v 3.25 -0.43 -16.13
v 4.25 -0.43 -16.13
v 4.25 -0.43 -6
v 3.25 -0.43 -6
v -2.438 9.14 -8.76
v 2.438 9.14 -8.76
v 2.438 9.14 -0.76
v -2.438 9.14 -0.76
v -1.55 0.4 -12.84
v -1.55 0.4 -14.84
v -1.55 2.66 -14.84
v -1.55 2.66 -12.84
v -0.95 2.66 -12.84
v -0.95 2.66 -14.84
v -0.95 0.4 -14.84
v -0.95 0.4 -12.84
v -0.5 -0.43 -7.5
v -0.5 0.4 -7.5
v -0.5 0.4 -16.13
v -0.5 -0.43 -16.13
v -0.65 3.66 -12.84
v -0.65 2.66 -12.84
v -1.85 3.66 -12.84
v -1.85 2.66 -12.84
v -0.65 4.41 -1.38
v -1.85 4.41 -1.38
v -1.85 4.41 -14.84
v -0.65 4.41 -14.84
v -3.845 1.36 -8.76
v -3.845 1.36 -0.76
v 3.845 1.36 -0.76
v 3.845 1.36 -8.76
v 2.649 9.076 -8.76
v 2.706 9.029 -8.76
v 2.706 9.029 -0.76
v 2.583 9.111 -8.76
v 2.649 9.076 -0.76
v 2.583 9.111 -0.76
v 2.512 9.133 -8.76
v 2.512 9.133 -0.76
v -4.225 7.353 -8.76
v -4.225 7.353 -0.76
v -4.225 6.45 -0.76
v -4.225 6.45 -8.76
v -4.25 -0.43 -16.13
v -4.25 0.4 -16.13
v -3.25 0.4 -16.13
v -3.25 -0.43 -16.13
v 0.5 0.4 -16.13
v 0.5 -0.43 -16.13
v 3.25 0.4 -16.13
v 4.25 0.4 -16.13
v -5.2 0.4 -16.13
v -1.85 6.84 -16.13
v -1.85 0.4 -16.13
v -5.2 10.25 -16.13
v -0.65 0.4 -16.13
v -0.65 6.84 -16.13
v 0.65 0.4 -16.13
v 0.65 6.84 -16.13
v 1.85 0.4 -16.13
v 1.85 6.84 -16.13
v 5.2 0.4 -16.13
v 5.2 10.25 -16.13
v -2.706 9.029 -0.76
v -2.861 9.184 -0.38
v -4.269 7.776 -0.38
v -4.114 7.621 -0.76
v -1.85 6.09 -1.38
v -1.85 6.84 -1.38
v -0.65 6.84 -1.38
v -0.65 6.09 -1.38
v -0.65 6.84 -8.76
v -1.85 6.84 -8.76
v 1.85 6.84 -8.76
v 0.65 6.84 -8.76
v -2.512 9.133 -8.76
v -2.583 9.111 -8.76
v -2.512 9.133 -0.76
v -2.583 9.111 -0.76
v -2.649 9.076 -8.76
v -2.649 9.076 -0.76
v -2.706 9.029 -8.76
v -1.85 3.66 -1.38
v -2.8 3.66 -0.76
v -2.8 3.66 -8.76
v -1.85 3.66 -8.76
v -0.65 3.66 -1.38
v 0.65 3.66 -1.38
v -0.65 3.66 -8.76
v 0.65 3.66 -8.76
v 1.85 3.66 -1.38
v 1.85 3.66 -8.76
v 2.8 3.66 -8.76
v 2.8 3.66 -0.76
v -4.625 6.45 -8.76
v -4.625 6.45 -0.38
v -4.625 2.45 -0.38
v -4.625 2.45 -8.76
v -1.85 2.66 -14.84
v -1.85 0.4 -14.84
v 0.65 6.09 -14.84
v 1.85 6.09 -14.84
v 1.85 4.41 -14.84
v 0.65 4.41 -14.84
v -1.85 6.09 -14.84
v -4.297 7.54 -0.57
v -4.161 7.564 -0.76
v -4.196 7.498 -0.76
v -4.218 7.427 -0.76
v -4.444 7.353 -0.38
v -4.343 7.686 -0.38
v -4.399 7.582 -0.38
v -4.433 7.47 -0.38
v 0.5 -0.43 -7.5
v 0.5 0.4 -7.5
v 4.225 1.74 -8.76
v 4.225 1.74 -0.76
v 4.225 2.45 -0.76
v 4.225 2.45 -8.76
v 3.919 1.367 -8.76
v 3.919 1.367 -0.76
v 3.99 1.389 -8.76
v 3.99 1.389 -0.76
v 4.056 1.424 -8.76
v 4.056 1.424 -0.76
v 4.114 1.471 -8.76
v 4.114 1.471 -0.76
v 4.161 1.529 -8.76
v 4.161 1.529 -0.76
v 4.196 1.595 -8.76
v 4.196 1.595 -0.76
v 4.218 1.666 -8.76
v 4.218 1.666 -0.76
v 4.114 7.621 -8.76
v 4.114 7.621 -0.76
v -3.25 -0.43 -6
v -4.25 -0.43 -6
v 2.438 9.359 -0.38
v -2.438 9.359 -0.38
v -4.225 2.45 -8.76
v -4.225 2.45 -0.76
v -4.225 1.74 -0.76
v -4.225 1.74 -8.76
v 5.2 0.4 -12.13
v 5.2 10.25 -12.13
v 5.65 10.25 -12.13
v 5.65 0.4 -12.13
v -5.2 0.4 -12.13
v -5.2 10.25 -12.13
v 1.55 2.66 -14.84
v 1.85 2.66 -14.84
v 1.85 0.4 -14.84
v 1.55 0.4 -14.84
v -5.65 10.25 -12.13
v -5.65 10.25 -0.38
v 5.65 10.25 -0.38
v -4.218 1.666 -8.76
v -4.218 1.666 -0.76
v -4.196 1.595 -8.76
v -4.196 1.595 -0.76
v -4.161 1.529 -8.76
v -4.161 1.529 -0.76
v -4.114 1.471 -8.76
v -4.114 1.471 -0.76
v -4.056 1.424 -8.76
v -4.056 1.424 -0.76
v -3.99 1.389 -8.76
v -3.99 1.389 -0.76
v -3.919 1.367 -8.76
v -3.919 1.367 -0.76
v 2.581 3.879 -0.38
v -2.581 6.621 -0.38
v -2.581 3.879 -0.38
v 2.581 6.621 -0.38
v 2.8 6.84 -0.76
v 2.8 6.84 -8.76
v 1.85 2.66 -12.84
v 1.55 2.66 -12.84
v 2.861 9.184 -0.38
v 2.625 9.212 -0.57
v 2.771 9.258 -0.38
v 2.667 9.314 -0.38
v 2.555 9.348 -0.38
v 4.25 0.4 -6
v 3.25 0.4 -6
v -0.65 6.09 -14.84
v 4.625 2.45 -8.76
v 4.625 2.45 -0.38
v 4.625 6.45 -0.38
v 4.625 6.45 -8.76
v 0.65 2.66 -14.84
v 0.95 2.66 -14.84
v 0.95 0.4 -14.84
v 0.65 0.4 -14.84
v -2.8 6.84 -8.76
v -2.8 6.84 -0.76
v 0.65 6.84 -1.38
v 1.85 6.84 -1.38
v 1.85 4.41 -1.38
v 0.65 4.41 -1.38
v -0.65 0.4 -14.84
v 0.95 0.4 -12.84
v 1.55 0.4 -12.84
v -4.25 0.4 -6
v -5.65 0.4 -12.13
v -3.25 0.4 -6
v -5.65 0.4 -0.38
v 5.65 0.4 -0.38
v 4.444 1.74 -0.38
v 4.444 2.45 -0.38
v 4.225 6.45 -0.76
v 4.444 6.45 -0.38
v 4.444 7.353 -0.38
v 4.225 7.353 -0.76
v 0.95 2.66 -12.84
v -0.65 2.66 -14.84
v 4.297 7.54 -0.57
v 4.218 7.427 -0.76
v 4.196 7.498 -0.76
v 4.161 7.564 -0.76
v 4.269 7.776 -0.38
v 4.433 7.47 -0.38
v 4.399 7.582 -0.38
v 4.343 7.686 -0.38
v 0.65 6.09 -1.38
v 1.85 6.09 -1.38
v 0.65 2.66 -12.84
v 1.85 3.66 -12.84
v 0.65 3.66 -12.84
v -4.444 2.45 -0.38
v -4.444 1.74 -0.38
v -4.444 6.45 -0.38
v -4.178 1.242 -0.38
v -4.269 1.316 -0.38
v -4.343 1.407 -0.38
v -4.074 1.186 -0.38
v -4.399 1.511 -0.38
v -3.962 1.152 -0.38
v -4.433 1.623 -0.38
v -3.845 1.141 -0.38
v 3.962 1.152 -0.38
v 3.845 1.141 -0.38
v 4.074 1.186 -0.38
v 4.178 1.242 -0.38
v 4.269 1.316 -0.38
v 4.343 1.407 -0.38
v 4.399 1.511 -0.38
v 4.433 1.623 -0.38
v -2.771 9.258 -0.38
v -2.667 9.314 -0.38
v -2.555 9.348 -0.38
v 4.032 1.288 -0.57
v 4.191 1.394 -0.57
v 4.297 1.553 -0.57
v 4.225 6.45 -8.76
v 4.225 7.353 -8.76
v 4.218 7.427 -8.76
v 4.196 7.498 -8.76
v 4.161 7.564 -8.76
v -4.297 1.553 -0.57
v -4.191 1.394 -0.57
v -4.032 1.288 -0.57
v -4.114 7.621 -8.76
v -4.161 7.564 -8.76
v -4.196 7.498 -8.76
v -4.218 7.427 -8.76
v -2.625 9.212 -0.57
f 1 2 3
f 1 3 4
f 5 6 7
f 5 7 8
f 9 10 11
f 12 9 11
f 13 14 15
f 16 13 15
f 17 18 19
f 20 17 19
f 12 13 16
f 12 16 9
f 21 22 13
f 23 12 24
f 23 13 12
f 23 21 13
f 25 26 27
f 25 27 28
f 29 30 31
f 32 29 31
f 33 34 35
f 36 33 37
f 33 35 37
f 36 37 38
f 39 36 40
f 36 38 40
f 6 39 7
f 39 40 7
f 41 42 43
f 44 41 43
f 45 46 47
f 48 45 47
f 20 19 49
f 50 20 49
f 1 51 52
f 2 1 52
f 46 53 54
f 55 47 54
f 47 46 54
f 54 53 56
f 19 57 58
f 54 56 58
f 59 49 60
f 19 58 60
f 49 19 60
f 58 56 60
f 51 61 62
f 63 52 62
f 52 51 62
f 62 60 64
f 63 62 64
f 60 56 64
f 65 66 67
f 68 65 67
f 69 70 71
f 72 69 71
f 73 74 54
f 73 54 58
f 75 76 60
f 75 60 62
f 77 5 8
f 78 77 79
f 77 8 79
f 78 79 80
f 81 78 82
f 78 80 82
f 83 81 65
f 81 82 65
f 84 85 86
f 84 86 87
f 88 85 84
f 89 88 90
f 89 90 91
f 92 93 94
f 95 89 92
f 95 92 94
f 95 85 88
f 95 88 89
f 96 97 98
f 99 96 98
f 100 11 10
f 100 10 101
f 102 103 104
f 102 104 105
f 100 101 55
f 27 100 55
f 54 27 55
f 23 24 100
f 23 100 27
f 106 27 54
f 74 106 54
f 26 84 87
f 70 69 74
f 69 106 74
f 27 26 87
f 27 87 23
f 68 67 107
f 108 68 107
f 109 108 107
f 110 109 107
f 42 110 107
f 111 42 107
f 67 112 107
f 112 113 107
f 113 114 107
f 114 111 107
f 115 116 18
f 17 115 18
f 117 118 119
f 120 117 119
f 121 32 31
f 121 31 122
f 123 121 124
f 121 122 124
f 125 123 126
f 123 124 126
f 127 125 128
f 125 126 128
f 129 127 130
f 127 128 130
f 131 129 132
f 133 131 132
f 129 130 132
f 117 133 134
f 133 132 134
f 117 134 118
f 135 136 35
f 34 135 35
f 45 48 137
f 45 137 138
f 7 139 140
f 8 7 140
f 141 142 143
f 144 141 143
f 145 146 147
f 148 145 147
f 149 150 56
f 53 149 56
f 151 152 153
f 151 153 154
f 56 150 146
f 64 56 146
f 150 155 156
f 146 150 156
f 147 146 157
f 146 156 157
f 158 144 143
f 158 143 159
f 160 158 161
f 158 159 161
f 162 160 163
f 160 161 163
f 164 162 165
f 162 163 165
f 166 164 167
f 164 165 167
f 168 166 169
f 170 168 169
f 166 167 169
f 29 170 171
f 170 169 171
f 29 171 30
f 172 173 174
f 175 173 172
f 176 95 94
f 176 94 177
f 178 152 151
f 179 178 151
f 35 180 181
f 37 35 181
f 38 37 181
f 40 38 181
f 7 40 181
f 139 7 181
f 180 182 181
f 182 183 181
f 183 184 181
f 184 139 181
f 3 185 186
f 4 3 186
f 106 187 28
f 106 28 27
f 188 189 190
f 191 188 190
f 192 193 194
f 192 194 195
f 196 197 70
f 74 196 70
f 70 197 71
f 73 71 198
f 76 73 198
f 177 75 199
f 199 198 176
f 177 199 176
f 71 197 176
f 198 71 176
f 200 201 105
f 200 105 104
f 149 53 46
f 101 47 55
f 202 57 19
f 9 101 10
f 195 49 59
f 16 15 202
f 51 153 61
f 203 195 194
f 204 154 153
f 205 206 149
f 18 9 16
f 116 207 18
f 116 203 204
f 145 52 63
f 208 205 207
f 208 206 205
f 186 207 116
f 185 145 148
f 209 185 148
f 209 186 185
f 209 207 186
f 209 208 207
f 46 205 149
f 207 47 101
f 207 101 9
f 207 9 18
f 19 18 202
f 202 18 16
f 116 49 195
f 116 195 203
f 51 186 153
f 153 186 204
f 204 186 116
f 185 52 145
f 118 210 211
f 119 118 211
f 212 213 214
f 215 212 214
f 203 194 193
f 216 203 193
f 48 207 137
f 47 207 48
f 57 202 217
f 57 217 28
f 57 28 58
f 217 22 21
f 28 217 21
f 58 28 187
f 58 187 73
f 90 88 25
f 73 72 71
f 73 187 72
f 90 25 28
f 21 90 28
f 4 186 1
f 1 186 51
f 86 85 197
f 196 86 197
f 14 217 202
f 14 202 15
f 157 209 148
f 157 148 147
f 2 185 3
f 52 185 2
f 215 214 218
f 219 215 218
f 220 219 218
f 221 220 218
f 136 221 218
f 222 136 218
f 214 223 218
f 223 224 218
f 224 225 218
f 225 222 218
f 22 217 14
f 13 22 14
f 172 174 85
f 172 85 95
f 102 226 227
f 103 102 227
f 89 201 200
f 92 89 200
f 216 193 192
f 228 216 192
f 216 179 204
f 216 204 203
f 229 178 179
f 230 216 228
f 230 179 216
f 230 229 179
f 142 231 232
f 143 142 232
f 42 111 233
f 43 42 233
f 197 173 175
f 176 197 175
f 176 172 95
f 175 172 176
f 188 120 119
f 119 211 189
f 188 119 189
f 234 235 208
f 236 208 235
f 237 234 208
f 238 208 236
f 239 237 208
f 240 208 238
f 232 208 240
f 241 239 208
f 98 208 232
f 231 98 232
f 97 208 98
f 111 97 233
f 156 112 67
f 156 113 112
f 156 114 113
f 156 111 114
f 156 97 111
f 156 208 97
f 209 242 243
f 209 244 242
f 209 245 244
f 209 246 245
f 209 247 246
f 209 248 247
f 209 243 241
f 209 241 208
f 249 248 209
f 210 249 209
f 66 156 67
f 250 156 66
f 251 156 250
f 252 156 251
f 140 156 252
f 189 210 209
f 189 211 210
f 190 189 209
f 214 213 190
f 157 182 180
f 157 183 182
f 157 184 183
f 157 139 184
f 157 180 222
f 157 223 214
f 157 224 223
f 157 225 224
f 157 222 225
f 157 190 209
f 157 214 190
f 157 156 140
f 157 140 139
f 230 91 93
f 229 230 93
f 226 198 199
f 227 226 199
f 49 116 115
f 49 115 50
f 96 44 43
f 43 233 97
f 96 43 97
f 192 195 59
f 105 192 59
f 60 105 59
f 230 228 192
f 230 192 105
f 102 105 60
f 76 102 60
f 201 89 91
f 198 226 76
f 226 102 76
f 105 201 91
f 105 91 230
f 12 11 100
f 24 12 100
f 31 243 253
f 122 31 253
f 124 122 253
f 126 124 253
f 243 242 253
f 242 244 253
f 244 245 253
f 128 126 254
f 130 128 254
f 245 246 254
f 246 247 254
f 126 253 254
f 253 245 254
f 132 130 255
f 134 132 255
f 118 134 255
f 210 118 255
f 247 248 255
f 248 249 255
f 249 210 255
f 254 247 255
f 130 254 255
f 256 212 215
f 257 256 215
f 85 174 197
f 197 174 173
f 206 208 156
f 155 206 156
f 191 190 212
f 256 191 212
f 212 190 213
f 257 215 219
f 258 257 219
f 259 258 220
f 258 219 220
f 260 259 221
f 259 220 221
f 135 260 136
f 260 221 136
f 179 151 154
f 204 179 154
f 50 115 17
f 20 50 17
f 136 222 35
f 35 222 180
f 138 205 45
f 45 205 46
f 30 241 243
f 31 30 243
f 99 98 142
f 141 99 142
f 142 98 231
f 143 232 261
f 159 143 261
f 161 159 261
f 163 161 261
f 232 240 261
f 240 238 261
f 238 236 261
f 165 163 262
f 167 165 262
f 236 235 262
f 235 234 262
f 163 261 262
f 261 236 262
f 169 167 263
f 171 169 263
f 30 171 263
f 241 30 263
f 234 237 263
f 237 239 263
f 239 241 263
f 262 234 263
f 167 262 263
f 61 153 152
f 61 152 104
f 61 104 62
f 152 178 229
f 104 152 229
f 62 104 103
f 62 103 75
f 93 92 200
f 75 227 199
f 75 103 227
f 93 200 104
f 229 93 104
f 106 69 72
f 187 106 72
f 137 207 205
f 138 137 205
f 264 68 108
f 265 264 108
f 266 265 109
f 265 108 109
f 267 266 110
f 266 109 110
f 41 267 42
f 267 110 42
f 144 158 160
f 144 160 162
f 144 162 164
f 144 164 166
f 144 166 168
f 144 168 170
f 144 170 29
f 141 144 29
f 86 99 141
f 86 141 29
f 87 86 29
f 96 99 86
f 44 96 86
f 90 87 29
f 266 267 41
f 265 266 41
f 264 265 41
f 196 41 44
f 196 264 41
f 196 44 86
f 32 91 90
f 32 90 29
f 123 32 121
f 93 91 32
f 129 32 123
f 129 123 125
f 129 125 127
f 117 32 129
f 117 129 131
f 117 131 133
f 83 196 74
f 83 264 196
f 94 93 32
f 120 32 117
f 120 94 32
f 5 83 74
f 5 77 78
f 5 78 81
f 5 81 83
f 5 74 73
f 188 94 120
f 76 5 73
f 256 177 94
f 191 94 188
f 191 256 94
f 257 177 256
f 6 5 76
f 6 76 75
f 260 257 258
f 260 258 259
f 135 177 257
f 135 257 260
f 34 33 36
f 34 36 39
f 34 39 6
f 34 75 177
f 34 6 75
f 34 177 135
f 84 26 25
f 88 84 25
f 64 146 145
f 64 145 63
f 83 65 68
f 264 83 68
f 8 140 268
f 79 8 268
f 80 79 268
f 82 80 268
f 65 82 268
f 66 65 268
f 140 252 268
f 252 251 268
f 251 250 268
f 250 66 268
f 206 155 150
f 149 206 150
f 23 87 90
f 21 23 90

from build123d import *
from OCP.BRepFilletAPI import BRepFilletAPI_MakeChamfer

# Parameters (mm, degrees)
SKETCH1_W           = 11.3
SKETCH1_H           = 9.85
BOSS_EXTRUDE1_DEPTH = 15.75
SKETCH2_W           = 0.45
SKETCH2_H           = 4
CUT_EXTRUDE1_DEPTH  = 15.75
SKETCH3_W           = 5.6
SKETCH3_H           = 3.18
CUT_EXTRUDE2_DEPTH  = 8.38
CHAMFER1_SIZE       = 0.38
CHAMFER1_SIZE2      = 0.219393102
CHAMFER2_SIZE       = 0.38
CHAMFER2_SIZE2      = 0.219393102
SKETCH4_W           = 1
SKETCH4_H           = 10.13
SKETCH4_H_2         = 8.63
BOSS_EXTRUDE2_DEPTH = 0.83
SKETCH5_W           = 1.2
SKETCH5_H           = 0.75
CUT_EXTRUDE3_DEPTH  = 19.829431749
SKETCH6_W           = 1.2
SKETCH6_H           = 6.44
CUT_EXTRUDE4_DEPTH  = 1.29
CUT_EXTRUDE5_DEPTH  = 2


with BuildPart() as part:
    # Sketch1 → Boss-Extrude1 (new body)
    with BuildSketch(Plane.XY.offset(-0.38)):
        with Locations((0, 5.325)):
            Rectangle(SKETCH1_W, SKETCH1_H)
    extrude(amount=-BOSS_EXTRUDE1_DEPTH)

    # Sketch2 → Cut-Extrude1 (cut)
    with BuildSketch(Plane(origin=(0, 10.25, 0), x_dir=(1, 0, 0), z_dir=(0, 1, 0))):
        with Locations((-5.425, 14.13)):
            Rectangle(SKETCH2_W, SKETCH2_H)
        with Locations((5.425, 14.13)):
            Rectangle(SKETCH2_W, SKETCH2_H)
    extrude(amount=-CUT_EXTRUDE1_DEPTH, mode=Mode.SUBTRACT)

    # Sketch3 → Cut-Extrude2 (cut)
    with BuildSketch(Plane.XY.offset(-0.38)):
        with BuildLine():
            Line((-4.225, 7.352598846), (-4.225, 6.45))
            Line((-4.225, 6.45), (-4.625, 6.45))
            Line((-4.625, 6.45), (-4.625, 2.45))
            Line((-4.625, 2.45), (-4.225, 2.45))
            Line((-4.225, 2.45), (-4.225, 1.74))
            ThreePointArc((-4.225, 1.74), (-4.113700577, 1.471299423), (-3.845, 1.36))
            Line((-3.845, 1.36), (3.845, 1.36))
            ThreePointArc((3.845, 1.36), (4.113700577, 1.471299423), (4.225, 1.74))
            Line((4.225, 1.74), (4.225, 2.45))
            Line((4.225, 2.45), (4.625, 2.45))
            Line((4.625, 2.45), (4.625, 6.45))
            Line((4.625, 6.45), (4.225, 6.45))
            Line((4.225, 6.45), (4.225, 7.352598846))
            ThreePointArc((4.225, 7.352598846), (4.196074222, 7.498018551), (4.113700577, 7.621299423))
            Line((4.113700577, 7.621299423), (2.706299423, 9.028700577))
            ThreePointArc((2.706299423, 9.028700577), (2.583018551, 9.111074222), (2.437598846, 9.14))
            Line((2.437598846, 9.14), (-2.437598846, 9.14))
            ThreePointArc((-2.437598846, 9.14), (-2.583018551, 9.111074222), (-2.706299423, 9.028700577))
            Line((-2.706299423, 9.028700577), (-4.113700577, 7.621299423))
            ThreePointArc((-4.113700577, 7.621299423), (-4.196074222, 7.498018551), (-4.225, 7.352598846))
        make_face()
        with Locations((0, 5.25)):
            Rectangle(SKETCH3_W, SKETCH3_H, mode=Mode.SUBTRACT)
    extrude(amount=-CUT_EXTRUDE2_DEPTH, mode=Mode.SUBTRACT)

    # Chamfer1: one chamfer whose edges measure the first distance from different faces: ONE call of the kernel's chamfer builder (chamfer() names one face for all edges)
    chamfer1_edges_1 = [part.edges().sort_by_distance(p)[0] for p in [
        (-2.8, 5.25, -0.38),
    ]]
    chamfer1_side_1 = [part.faces().sort_by_distance(p)[0] for p in [
        (-2.8, 5.25, -4.57),
    ]]
    chamfer1_edges_2 = [part.edges().sort_by_distance(p)[0] for p in [
        (0, 6.84, -0.38),
    ]]
    chamfer1_side_2 = [part.faces().sort_by_distance(p)[0] for p in [
        (0, 6.84, -4.57),
    ]]
    chamfer1_edges_3 = [part.edges().sort_by_distance(p)[0] for p in [
        (2.8, 5.25, -0.38),
    ]]
    chamfer1_side_3 = [part.faces().sort_by_distance(p)[0] for p in [
        (2.8, 5.25, -4.57),
    ]]
    chamfer1_edges_4 = [part.edges().sort_by_distance(p)[0] for p in [
        (0, 3.66, -0.38),
    ]]
    chamfer1_side_4 = [part.faces().sort_by_distance(p)[0] for p in [
        (0, 3.66, -4.57),
    ]]
    chamfer1 = BRepFilletAPI_MakeChamfer(part.part.solid().wrapped)
    for e in chamfer1_edges_1:
        chamfer1.Add(CHAMFER1_SIZE, CHAMFER1_SIZE2, e.wrapped, chamfer1_side_1[0].wrapped)  # the first distance lies on this face
    for e in chamfer1_edges_2:
        chamfer1.Add(CHAMFER1_SIZE, CHAMFER1_SIZE2, e.wrapped, chamfer1_side_2[0].wrapped)  # the first distance lies on this face
    for e in chamfer1_edges_3:
        chamfer1.Add(CHAMFER1_SIZE, CHAMFER1_SIZE2, e.wrapped, chamfer1_side_3[0].wrapped)  # the first distance lies on this face
    for e in chamfer1_edges_4:
        chamfer1.Add(CHAMFER1_SIZE, CHAMFER1_SIZE2, e.wrapped, chamfer1_side_4[0].wrapped)  # the first distance lies on this face
    add(Compound.cast(chamfer1.Shape()), mode=Mode.REPLACE)

    # Chamfer2: one chamfer whose edges measure the first distance from different faces: ONE call of the kernel's chamfer builder (chamfer() names one face for all edges)
    chamfer2_edges_1 = [part.edges().sort_by_distance(p)[0] for p in [
        (-4.196074222, 7.498018551, -0.38),
    ]]
    chamfer2_side_1 = [part.faces().sort_by_distance(p)[0] for p in [
        (-4.196074222, 7.498018551, -4.57),
    ]]
    chamfer2_edges_2 = [part.edges().sort_by_distance(p)[0] for p in [
        (-4.225, 6.901299423, -0.38),
    ]]
    chamfer2_side_2 = [part.faces().sort_by_distance(p)[0] for p in [
        (-4.225, 6.901299423, -4.57),
    ]]
    chamfer2_edges_3 = [part.edges().sort_by_distance(p)[0] for p in [
        (-4.225, 2.095, -0.38),
    ]]
    chamfer2_side_3 = [part.faces().sort_by_distance(p)[0] for p in [
        (-4.225, 2.095, -4.57),
    ]]
    chamfer2_edges_4 = [part.edges().sort_by_distance(p)[0] for p in [
        (-4.113700577, 1.471299423, -0.38),
    ]]
    chamfer2_side_4 = [part.faces().sort_by_distance(p)[0] for p in [
        (-4.113700577, 1.471299423, -4.57),
    ]]
    chamfer2_edges_5 = [part.edges().sort_by_distance(p)[0] for p in [
        (0, 1.36, -0.38),
    ]]
    chamfer2_side_5 = [part.faces().sort_by_distance(p)[0] for p in [
        (0, 1.36, -4.57),
    ]]
    chamfer2_edges_6 = [part.edges().sort_by_distance(p)[0] for p in [
        (4.113700577, 1.471299423, -0.38),
    ]]
    chamfer2_side_6 = [part.faces().sort_by_distance(p)[0] for p in [
        (4.113700577, 1.471299423, -4.57),
    ]]
    chamfer2_edges_7 = [part.edges().sort_by_distance(p)[0] for p in [
        (4.225, 2.095, -0.38),
    ]]
    chamfer2_side_7 = [part.faces().sort_by_distance(p)[0] for p in [
        (4.225, 2.095, -4.57),
    ]]
    chamfer2_edges_8 = [part.edges().sort_by_distance(p)[0] for p in [
        (4.225, 6.901299423, -0.38),
    ]]
    chamfer2_side_8 = [part.faces().sort_by_distance(p)[0] for p in [
        (4.225, 6.901299423, -4.57),
    ]]
    chamfer2_edges_9 = [part.edges().sort_by_distance(p)[0] for p in [
        (4.196074222, 7.498018551, -0.38),
    ]]
    chamfer2_side_9 = [part.faces().sort_by_distance(p)[0] for p in [
        (4.196074222, 7.498018551, -4.57),
    ]]
    chamfer2_edges_10 = [part.edges().sort_by_distance(p)[0] for p in [
        (3.41, 8.325, -0.38),
    ]]
    chamfer2_side_10 = [part.faces().sort_by_distance(p)[0] for p in [
        (3.41, 8.325, -4.57),
    ]]
    chamfer2_edges_11 = [part.edges().sort_by_distance(p)[0] for p in [
        (2.583018551, 9.111074222, -0.38),
    ]]
    chamfer2_side_11 = [part.faces().sort_by_distance(p)[0] for p in [
        (2.583018551, 9.111074222, -4.57),
    ]]
    chamfer2_edges_12 = [part.edges().sort_by_distance(p)[0] for p in [
        (0, 9.14, -0.38),
    ]]
    chamfer2_side_12 = [part.faces().sort_by_distance(p)[0] for p in [
        (0, 9.14, -4.57),
    ]]
    chamfer2_edges_13 = [part.edges().sort_by_distance(p)[0] for p in [
        (-2.583018551, 9.111074222, -0.38),
    ]]
    chamfer2_side_13 = [part.faces().sort_by_distance(p)[0] for p in [
        (-2.583018551, 9.111074222, -4.57),
    ]]
    chamfer2_edges_14 = [part.edges().sort_by_distance(p)[0] for p in [
        (-3.41, 8.325, -0.38),
    ]]
    chamfer2_side_14 = [part.faces().sort_by_distance(p)[0] for p in [
        (-3.41, 8.325, -4.57),
    ]]
    chamfer2 = BRepFilletAPI_MakeChamfer(part.part.solid().wrapped)
    for e in chamfer2_edges_1:
        chamfer2.Add(CHAMFER2_SIZE, CHAMFER2_SIZE2, e.wrapped, chamfer2_side_1[0].wrapped)  # the first distance lies on this face
    for e in chamfer2_edges_2:
        chamfer2.Add(CHAMFER2_SIZE, CHAMFER2_SIZE2, e.wrapped, chamfer2_side_2[0].wrapped)  # the first distance lies on this face
    for e in chamfer2_edges_3:
        chamfer2.Add(CHAMFER2_SIZE, CHAMFER2_SIZE2, e.wrapped, chamfer2_side_3[0].wrapped)  # the first distance lies on this face
    for e in chamfer2_edges_4:
        chamfer2.Add(CHAMFER2_SIZE, CHAMFER2_SIZE2, e.wrapped, chamfer2_side_4[0].wrapped)  # the first distance lies on this face
    for e in chamfer2_edges_5:
        chamfer2.Add(CHAMFER2_SIZE, CHAMFER2_SIZE2, e.wrapped, chamfer2_side_5[0].wrapped)  # the first distance lies on this face
    for e in chamfer2_edges_6:
        chamfer2.Add(CHAMFER2_SIZE, CHAMFER2_SIZE2, e.wrapped, chamfer2_side_6[0].wrapped)  # the first distance lies on this face
    for e in chamfer2_edges_7:
        chamfer2.Add(CHAMFER2_SIZE, CHAMFER2_SIZE2, e.wrapped, chamfer2_side_7[0].wrapped)  # the first distance lies on this face
    for e in chamfer2_edges_8:
        chamfer2.Add(CHAMFER2_SIZE, CHAMFER2_SIZE2, e.wrapped, chamfer2_side_8[0].wrapped)  # the first distance lies on this face
    for e in chamfer2_edges_9:
        chamfer2.Add(CHAMFER2_SIZE, CHAMFER2_SIZE2, e.wrapped, chamfer2_side_9[0].wrapped)  # the first distance lies on this face
    for e in chamfer2_edges_10:
        chamfer2.Add(CHAMFER2_SIZE, CHAMFER2_SIZE2, e.wrapped, chamfer2_side_10[0].wrapped)  # the first distance lies on this face
    for e in chamfer2_edges_11:
        chamfer2.Add(CHAMFER2_SIZE, CHAMFER2_SIZE2, e.wrapped, chamfer2_side_11[0].wrapped)  # the first distance lies on this face
    for e in chamfer2_edges_12:
        chamfer2.Add(CHAMFER2_SIZE, CHAMFER2_SIZE2, e.wrapped, chamfer2_side_12[0].wrapped)  # the first distance lies on this face
    for e in chamfer2_edges_13:
        chamfer2.Add(CHAMFER2_SIZE, CHAMFER2_SIZE2, e.wrapped, chamfer2_side_13[0].wrapped)  # the first distance lies on this face
    for e in chamfer2_edges_14:
        chamfer2.Add(CHAMFER2_SIZE, CHAMFER2_SIZE2, e.wrapped, chamfer2_side_14[0].wrapped)  # the first distance lies on this face
    add(Compound.cast(chamfer2.Shape()), mode=Mode.REPLACE)

    # Sketch4 → Boss-Extrude2 (add)
    with BuildSketch(Plane(origin=(0, 0.4, 0), x_dir=(-1, 0, 0), z_dir=(0, -1, 0))):
        with Locations((3.75, 11.065)):
            Rectangle(SKETCH4_W, SKETCH4_H)
        with Locations((0, 11.815)):
            Rectangle(SKETCH4_W, SKETCH4_H_2)
        with Locations((-3.75, 11.065)):
            Rectangle(SKETCH4_W, SKETCH4_H)
    extrude(amount=BOSS_EXTRUDE2_DEPTH)

    # Sketch5 → Cut-Extrude3 (cut, through all)
    with BuildSketch(Plane.XY.offset(-1.38)):
        with Locations((-1.25, 6.465)):
            Rectangle(SKETCH5_W, SKETCH5_H)
        with Locations((1.25, 6.465)):
            Rectangle(SKETCH5_W, SKETCH5_H)
        with Locations((1.25, 4.035)):
            Rectangle(SKETCH5_W, SKETCH5_H)
        with Locations((-1.25, 4.035)):
            Rectangle(SKETCH5_W, SKETCH5_H)
    extrude(amount=-CUT_EXTRUDE3_DEPTH, mode=Mode.SUBTRACT)

    # Sketch6 → Cut-Extrude4 (cut)
    with BuildSketch(Plane(origin=(0, 0, -16.13), x_dir=(-1, 0, 0), z_dir=(0, 0, -1))):
        with Locations((-1.25, 3.62)):
            Rectangle(SKETCH6_W, SKETCH6_H)
        with Locations((1.25, 3.62)):
            Rectangle(SKETCH6_W, SKETCH6_H)
    extrude(amount=-CUT_EXTRUDE4_DEPTH, mode=Mode.SUBTRACT)

    # Sketch7 → Cut-Extrude5 (cut)
    with BuildSketch(Plane(origin=(0, 0, -14.84), x_dir=(-1, 0, 0), z_dir=(0, 0, -1))):
        Polygon((-1.55, 2.66), (-1.55, 0), (-0.95, 0), (-0.95, 2.66), (-0.65, 2.66), (-0.65, 4.41), (-1.85, 4.41), (-1.85, 2.66), align=None)
        Polygon((0.95, 2.66), (0.95, 0), (1.55, 0), (1.55, 2.66), (1.85, 2.66), (1.85, 4.41), (0.65, 4.41), (0.65, 2.66), align=None)
    extrude(amount=-CUT_EXTRUDE5_DEPTH, mode=Mode.SUBTRACT)


solid = part.part
